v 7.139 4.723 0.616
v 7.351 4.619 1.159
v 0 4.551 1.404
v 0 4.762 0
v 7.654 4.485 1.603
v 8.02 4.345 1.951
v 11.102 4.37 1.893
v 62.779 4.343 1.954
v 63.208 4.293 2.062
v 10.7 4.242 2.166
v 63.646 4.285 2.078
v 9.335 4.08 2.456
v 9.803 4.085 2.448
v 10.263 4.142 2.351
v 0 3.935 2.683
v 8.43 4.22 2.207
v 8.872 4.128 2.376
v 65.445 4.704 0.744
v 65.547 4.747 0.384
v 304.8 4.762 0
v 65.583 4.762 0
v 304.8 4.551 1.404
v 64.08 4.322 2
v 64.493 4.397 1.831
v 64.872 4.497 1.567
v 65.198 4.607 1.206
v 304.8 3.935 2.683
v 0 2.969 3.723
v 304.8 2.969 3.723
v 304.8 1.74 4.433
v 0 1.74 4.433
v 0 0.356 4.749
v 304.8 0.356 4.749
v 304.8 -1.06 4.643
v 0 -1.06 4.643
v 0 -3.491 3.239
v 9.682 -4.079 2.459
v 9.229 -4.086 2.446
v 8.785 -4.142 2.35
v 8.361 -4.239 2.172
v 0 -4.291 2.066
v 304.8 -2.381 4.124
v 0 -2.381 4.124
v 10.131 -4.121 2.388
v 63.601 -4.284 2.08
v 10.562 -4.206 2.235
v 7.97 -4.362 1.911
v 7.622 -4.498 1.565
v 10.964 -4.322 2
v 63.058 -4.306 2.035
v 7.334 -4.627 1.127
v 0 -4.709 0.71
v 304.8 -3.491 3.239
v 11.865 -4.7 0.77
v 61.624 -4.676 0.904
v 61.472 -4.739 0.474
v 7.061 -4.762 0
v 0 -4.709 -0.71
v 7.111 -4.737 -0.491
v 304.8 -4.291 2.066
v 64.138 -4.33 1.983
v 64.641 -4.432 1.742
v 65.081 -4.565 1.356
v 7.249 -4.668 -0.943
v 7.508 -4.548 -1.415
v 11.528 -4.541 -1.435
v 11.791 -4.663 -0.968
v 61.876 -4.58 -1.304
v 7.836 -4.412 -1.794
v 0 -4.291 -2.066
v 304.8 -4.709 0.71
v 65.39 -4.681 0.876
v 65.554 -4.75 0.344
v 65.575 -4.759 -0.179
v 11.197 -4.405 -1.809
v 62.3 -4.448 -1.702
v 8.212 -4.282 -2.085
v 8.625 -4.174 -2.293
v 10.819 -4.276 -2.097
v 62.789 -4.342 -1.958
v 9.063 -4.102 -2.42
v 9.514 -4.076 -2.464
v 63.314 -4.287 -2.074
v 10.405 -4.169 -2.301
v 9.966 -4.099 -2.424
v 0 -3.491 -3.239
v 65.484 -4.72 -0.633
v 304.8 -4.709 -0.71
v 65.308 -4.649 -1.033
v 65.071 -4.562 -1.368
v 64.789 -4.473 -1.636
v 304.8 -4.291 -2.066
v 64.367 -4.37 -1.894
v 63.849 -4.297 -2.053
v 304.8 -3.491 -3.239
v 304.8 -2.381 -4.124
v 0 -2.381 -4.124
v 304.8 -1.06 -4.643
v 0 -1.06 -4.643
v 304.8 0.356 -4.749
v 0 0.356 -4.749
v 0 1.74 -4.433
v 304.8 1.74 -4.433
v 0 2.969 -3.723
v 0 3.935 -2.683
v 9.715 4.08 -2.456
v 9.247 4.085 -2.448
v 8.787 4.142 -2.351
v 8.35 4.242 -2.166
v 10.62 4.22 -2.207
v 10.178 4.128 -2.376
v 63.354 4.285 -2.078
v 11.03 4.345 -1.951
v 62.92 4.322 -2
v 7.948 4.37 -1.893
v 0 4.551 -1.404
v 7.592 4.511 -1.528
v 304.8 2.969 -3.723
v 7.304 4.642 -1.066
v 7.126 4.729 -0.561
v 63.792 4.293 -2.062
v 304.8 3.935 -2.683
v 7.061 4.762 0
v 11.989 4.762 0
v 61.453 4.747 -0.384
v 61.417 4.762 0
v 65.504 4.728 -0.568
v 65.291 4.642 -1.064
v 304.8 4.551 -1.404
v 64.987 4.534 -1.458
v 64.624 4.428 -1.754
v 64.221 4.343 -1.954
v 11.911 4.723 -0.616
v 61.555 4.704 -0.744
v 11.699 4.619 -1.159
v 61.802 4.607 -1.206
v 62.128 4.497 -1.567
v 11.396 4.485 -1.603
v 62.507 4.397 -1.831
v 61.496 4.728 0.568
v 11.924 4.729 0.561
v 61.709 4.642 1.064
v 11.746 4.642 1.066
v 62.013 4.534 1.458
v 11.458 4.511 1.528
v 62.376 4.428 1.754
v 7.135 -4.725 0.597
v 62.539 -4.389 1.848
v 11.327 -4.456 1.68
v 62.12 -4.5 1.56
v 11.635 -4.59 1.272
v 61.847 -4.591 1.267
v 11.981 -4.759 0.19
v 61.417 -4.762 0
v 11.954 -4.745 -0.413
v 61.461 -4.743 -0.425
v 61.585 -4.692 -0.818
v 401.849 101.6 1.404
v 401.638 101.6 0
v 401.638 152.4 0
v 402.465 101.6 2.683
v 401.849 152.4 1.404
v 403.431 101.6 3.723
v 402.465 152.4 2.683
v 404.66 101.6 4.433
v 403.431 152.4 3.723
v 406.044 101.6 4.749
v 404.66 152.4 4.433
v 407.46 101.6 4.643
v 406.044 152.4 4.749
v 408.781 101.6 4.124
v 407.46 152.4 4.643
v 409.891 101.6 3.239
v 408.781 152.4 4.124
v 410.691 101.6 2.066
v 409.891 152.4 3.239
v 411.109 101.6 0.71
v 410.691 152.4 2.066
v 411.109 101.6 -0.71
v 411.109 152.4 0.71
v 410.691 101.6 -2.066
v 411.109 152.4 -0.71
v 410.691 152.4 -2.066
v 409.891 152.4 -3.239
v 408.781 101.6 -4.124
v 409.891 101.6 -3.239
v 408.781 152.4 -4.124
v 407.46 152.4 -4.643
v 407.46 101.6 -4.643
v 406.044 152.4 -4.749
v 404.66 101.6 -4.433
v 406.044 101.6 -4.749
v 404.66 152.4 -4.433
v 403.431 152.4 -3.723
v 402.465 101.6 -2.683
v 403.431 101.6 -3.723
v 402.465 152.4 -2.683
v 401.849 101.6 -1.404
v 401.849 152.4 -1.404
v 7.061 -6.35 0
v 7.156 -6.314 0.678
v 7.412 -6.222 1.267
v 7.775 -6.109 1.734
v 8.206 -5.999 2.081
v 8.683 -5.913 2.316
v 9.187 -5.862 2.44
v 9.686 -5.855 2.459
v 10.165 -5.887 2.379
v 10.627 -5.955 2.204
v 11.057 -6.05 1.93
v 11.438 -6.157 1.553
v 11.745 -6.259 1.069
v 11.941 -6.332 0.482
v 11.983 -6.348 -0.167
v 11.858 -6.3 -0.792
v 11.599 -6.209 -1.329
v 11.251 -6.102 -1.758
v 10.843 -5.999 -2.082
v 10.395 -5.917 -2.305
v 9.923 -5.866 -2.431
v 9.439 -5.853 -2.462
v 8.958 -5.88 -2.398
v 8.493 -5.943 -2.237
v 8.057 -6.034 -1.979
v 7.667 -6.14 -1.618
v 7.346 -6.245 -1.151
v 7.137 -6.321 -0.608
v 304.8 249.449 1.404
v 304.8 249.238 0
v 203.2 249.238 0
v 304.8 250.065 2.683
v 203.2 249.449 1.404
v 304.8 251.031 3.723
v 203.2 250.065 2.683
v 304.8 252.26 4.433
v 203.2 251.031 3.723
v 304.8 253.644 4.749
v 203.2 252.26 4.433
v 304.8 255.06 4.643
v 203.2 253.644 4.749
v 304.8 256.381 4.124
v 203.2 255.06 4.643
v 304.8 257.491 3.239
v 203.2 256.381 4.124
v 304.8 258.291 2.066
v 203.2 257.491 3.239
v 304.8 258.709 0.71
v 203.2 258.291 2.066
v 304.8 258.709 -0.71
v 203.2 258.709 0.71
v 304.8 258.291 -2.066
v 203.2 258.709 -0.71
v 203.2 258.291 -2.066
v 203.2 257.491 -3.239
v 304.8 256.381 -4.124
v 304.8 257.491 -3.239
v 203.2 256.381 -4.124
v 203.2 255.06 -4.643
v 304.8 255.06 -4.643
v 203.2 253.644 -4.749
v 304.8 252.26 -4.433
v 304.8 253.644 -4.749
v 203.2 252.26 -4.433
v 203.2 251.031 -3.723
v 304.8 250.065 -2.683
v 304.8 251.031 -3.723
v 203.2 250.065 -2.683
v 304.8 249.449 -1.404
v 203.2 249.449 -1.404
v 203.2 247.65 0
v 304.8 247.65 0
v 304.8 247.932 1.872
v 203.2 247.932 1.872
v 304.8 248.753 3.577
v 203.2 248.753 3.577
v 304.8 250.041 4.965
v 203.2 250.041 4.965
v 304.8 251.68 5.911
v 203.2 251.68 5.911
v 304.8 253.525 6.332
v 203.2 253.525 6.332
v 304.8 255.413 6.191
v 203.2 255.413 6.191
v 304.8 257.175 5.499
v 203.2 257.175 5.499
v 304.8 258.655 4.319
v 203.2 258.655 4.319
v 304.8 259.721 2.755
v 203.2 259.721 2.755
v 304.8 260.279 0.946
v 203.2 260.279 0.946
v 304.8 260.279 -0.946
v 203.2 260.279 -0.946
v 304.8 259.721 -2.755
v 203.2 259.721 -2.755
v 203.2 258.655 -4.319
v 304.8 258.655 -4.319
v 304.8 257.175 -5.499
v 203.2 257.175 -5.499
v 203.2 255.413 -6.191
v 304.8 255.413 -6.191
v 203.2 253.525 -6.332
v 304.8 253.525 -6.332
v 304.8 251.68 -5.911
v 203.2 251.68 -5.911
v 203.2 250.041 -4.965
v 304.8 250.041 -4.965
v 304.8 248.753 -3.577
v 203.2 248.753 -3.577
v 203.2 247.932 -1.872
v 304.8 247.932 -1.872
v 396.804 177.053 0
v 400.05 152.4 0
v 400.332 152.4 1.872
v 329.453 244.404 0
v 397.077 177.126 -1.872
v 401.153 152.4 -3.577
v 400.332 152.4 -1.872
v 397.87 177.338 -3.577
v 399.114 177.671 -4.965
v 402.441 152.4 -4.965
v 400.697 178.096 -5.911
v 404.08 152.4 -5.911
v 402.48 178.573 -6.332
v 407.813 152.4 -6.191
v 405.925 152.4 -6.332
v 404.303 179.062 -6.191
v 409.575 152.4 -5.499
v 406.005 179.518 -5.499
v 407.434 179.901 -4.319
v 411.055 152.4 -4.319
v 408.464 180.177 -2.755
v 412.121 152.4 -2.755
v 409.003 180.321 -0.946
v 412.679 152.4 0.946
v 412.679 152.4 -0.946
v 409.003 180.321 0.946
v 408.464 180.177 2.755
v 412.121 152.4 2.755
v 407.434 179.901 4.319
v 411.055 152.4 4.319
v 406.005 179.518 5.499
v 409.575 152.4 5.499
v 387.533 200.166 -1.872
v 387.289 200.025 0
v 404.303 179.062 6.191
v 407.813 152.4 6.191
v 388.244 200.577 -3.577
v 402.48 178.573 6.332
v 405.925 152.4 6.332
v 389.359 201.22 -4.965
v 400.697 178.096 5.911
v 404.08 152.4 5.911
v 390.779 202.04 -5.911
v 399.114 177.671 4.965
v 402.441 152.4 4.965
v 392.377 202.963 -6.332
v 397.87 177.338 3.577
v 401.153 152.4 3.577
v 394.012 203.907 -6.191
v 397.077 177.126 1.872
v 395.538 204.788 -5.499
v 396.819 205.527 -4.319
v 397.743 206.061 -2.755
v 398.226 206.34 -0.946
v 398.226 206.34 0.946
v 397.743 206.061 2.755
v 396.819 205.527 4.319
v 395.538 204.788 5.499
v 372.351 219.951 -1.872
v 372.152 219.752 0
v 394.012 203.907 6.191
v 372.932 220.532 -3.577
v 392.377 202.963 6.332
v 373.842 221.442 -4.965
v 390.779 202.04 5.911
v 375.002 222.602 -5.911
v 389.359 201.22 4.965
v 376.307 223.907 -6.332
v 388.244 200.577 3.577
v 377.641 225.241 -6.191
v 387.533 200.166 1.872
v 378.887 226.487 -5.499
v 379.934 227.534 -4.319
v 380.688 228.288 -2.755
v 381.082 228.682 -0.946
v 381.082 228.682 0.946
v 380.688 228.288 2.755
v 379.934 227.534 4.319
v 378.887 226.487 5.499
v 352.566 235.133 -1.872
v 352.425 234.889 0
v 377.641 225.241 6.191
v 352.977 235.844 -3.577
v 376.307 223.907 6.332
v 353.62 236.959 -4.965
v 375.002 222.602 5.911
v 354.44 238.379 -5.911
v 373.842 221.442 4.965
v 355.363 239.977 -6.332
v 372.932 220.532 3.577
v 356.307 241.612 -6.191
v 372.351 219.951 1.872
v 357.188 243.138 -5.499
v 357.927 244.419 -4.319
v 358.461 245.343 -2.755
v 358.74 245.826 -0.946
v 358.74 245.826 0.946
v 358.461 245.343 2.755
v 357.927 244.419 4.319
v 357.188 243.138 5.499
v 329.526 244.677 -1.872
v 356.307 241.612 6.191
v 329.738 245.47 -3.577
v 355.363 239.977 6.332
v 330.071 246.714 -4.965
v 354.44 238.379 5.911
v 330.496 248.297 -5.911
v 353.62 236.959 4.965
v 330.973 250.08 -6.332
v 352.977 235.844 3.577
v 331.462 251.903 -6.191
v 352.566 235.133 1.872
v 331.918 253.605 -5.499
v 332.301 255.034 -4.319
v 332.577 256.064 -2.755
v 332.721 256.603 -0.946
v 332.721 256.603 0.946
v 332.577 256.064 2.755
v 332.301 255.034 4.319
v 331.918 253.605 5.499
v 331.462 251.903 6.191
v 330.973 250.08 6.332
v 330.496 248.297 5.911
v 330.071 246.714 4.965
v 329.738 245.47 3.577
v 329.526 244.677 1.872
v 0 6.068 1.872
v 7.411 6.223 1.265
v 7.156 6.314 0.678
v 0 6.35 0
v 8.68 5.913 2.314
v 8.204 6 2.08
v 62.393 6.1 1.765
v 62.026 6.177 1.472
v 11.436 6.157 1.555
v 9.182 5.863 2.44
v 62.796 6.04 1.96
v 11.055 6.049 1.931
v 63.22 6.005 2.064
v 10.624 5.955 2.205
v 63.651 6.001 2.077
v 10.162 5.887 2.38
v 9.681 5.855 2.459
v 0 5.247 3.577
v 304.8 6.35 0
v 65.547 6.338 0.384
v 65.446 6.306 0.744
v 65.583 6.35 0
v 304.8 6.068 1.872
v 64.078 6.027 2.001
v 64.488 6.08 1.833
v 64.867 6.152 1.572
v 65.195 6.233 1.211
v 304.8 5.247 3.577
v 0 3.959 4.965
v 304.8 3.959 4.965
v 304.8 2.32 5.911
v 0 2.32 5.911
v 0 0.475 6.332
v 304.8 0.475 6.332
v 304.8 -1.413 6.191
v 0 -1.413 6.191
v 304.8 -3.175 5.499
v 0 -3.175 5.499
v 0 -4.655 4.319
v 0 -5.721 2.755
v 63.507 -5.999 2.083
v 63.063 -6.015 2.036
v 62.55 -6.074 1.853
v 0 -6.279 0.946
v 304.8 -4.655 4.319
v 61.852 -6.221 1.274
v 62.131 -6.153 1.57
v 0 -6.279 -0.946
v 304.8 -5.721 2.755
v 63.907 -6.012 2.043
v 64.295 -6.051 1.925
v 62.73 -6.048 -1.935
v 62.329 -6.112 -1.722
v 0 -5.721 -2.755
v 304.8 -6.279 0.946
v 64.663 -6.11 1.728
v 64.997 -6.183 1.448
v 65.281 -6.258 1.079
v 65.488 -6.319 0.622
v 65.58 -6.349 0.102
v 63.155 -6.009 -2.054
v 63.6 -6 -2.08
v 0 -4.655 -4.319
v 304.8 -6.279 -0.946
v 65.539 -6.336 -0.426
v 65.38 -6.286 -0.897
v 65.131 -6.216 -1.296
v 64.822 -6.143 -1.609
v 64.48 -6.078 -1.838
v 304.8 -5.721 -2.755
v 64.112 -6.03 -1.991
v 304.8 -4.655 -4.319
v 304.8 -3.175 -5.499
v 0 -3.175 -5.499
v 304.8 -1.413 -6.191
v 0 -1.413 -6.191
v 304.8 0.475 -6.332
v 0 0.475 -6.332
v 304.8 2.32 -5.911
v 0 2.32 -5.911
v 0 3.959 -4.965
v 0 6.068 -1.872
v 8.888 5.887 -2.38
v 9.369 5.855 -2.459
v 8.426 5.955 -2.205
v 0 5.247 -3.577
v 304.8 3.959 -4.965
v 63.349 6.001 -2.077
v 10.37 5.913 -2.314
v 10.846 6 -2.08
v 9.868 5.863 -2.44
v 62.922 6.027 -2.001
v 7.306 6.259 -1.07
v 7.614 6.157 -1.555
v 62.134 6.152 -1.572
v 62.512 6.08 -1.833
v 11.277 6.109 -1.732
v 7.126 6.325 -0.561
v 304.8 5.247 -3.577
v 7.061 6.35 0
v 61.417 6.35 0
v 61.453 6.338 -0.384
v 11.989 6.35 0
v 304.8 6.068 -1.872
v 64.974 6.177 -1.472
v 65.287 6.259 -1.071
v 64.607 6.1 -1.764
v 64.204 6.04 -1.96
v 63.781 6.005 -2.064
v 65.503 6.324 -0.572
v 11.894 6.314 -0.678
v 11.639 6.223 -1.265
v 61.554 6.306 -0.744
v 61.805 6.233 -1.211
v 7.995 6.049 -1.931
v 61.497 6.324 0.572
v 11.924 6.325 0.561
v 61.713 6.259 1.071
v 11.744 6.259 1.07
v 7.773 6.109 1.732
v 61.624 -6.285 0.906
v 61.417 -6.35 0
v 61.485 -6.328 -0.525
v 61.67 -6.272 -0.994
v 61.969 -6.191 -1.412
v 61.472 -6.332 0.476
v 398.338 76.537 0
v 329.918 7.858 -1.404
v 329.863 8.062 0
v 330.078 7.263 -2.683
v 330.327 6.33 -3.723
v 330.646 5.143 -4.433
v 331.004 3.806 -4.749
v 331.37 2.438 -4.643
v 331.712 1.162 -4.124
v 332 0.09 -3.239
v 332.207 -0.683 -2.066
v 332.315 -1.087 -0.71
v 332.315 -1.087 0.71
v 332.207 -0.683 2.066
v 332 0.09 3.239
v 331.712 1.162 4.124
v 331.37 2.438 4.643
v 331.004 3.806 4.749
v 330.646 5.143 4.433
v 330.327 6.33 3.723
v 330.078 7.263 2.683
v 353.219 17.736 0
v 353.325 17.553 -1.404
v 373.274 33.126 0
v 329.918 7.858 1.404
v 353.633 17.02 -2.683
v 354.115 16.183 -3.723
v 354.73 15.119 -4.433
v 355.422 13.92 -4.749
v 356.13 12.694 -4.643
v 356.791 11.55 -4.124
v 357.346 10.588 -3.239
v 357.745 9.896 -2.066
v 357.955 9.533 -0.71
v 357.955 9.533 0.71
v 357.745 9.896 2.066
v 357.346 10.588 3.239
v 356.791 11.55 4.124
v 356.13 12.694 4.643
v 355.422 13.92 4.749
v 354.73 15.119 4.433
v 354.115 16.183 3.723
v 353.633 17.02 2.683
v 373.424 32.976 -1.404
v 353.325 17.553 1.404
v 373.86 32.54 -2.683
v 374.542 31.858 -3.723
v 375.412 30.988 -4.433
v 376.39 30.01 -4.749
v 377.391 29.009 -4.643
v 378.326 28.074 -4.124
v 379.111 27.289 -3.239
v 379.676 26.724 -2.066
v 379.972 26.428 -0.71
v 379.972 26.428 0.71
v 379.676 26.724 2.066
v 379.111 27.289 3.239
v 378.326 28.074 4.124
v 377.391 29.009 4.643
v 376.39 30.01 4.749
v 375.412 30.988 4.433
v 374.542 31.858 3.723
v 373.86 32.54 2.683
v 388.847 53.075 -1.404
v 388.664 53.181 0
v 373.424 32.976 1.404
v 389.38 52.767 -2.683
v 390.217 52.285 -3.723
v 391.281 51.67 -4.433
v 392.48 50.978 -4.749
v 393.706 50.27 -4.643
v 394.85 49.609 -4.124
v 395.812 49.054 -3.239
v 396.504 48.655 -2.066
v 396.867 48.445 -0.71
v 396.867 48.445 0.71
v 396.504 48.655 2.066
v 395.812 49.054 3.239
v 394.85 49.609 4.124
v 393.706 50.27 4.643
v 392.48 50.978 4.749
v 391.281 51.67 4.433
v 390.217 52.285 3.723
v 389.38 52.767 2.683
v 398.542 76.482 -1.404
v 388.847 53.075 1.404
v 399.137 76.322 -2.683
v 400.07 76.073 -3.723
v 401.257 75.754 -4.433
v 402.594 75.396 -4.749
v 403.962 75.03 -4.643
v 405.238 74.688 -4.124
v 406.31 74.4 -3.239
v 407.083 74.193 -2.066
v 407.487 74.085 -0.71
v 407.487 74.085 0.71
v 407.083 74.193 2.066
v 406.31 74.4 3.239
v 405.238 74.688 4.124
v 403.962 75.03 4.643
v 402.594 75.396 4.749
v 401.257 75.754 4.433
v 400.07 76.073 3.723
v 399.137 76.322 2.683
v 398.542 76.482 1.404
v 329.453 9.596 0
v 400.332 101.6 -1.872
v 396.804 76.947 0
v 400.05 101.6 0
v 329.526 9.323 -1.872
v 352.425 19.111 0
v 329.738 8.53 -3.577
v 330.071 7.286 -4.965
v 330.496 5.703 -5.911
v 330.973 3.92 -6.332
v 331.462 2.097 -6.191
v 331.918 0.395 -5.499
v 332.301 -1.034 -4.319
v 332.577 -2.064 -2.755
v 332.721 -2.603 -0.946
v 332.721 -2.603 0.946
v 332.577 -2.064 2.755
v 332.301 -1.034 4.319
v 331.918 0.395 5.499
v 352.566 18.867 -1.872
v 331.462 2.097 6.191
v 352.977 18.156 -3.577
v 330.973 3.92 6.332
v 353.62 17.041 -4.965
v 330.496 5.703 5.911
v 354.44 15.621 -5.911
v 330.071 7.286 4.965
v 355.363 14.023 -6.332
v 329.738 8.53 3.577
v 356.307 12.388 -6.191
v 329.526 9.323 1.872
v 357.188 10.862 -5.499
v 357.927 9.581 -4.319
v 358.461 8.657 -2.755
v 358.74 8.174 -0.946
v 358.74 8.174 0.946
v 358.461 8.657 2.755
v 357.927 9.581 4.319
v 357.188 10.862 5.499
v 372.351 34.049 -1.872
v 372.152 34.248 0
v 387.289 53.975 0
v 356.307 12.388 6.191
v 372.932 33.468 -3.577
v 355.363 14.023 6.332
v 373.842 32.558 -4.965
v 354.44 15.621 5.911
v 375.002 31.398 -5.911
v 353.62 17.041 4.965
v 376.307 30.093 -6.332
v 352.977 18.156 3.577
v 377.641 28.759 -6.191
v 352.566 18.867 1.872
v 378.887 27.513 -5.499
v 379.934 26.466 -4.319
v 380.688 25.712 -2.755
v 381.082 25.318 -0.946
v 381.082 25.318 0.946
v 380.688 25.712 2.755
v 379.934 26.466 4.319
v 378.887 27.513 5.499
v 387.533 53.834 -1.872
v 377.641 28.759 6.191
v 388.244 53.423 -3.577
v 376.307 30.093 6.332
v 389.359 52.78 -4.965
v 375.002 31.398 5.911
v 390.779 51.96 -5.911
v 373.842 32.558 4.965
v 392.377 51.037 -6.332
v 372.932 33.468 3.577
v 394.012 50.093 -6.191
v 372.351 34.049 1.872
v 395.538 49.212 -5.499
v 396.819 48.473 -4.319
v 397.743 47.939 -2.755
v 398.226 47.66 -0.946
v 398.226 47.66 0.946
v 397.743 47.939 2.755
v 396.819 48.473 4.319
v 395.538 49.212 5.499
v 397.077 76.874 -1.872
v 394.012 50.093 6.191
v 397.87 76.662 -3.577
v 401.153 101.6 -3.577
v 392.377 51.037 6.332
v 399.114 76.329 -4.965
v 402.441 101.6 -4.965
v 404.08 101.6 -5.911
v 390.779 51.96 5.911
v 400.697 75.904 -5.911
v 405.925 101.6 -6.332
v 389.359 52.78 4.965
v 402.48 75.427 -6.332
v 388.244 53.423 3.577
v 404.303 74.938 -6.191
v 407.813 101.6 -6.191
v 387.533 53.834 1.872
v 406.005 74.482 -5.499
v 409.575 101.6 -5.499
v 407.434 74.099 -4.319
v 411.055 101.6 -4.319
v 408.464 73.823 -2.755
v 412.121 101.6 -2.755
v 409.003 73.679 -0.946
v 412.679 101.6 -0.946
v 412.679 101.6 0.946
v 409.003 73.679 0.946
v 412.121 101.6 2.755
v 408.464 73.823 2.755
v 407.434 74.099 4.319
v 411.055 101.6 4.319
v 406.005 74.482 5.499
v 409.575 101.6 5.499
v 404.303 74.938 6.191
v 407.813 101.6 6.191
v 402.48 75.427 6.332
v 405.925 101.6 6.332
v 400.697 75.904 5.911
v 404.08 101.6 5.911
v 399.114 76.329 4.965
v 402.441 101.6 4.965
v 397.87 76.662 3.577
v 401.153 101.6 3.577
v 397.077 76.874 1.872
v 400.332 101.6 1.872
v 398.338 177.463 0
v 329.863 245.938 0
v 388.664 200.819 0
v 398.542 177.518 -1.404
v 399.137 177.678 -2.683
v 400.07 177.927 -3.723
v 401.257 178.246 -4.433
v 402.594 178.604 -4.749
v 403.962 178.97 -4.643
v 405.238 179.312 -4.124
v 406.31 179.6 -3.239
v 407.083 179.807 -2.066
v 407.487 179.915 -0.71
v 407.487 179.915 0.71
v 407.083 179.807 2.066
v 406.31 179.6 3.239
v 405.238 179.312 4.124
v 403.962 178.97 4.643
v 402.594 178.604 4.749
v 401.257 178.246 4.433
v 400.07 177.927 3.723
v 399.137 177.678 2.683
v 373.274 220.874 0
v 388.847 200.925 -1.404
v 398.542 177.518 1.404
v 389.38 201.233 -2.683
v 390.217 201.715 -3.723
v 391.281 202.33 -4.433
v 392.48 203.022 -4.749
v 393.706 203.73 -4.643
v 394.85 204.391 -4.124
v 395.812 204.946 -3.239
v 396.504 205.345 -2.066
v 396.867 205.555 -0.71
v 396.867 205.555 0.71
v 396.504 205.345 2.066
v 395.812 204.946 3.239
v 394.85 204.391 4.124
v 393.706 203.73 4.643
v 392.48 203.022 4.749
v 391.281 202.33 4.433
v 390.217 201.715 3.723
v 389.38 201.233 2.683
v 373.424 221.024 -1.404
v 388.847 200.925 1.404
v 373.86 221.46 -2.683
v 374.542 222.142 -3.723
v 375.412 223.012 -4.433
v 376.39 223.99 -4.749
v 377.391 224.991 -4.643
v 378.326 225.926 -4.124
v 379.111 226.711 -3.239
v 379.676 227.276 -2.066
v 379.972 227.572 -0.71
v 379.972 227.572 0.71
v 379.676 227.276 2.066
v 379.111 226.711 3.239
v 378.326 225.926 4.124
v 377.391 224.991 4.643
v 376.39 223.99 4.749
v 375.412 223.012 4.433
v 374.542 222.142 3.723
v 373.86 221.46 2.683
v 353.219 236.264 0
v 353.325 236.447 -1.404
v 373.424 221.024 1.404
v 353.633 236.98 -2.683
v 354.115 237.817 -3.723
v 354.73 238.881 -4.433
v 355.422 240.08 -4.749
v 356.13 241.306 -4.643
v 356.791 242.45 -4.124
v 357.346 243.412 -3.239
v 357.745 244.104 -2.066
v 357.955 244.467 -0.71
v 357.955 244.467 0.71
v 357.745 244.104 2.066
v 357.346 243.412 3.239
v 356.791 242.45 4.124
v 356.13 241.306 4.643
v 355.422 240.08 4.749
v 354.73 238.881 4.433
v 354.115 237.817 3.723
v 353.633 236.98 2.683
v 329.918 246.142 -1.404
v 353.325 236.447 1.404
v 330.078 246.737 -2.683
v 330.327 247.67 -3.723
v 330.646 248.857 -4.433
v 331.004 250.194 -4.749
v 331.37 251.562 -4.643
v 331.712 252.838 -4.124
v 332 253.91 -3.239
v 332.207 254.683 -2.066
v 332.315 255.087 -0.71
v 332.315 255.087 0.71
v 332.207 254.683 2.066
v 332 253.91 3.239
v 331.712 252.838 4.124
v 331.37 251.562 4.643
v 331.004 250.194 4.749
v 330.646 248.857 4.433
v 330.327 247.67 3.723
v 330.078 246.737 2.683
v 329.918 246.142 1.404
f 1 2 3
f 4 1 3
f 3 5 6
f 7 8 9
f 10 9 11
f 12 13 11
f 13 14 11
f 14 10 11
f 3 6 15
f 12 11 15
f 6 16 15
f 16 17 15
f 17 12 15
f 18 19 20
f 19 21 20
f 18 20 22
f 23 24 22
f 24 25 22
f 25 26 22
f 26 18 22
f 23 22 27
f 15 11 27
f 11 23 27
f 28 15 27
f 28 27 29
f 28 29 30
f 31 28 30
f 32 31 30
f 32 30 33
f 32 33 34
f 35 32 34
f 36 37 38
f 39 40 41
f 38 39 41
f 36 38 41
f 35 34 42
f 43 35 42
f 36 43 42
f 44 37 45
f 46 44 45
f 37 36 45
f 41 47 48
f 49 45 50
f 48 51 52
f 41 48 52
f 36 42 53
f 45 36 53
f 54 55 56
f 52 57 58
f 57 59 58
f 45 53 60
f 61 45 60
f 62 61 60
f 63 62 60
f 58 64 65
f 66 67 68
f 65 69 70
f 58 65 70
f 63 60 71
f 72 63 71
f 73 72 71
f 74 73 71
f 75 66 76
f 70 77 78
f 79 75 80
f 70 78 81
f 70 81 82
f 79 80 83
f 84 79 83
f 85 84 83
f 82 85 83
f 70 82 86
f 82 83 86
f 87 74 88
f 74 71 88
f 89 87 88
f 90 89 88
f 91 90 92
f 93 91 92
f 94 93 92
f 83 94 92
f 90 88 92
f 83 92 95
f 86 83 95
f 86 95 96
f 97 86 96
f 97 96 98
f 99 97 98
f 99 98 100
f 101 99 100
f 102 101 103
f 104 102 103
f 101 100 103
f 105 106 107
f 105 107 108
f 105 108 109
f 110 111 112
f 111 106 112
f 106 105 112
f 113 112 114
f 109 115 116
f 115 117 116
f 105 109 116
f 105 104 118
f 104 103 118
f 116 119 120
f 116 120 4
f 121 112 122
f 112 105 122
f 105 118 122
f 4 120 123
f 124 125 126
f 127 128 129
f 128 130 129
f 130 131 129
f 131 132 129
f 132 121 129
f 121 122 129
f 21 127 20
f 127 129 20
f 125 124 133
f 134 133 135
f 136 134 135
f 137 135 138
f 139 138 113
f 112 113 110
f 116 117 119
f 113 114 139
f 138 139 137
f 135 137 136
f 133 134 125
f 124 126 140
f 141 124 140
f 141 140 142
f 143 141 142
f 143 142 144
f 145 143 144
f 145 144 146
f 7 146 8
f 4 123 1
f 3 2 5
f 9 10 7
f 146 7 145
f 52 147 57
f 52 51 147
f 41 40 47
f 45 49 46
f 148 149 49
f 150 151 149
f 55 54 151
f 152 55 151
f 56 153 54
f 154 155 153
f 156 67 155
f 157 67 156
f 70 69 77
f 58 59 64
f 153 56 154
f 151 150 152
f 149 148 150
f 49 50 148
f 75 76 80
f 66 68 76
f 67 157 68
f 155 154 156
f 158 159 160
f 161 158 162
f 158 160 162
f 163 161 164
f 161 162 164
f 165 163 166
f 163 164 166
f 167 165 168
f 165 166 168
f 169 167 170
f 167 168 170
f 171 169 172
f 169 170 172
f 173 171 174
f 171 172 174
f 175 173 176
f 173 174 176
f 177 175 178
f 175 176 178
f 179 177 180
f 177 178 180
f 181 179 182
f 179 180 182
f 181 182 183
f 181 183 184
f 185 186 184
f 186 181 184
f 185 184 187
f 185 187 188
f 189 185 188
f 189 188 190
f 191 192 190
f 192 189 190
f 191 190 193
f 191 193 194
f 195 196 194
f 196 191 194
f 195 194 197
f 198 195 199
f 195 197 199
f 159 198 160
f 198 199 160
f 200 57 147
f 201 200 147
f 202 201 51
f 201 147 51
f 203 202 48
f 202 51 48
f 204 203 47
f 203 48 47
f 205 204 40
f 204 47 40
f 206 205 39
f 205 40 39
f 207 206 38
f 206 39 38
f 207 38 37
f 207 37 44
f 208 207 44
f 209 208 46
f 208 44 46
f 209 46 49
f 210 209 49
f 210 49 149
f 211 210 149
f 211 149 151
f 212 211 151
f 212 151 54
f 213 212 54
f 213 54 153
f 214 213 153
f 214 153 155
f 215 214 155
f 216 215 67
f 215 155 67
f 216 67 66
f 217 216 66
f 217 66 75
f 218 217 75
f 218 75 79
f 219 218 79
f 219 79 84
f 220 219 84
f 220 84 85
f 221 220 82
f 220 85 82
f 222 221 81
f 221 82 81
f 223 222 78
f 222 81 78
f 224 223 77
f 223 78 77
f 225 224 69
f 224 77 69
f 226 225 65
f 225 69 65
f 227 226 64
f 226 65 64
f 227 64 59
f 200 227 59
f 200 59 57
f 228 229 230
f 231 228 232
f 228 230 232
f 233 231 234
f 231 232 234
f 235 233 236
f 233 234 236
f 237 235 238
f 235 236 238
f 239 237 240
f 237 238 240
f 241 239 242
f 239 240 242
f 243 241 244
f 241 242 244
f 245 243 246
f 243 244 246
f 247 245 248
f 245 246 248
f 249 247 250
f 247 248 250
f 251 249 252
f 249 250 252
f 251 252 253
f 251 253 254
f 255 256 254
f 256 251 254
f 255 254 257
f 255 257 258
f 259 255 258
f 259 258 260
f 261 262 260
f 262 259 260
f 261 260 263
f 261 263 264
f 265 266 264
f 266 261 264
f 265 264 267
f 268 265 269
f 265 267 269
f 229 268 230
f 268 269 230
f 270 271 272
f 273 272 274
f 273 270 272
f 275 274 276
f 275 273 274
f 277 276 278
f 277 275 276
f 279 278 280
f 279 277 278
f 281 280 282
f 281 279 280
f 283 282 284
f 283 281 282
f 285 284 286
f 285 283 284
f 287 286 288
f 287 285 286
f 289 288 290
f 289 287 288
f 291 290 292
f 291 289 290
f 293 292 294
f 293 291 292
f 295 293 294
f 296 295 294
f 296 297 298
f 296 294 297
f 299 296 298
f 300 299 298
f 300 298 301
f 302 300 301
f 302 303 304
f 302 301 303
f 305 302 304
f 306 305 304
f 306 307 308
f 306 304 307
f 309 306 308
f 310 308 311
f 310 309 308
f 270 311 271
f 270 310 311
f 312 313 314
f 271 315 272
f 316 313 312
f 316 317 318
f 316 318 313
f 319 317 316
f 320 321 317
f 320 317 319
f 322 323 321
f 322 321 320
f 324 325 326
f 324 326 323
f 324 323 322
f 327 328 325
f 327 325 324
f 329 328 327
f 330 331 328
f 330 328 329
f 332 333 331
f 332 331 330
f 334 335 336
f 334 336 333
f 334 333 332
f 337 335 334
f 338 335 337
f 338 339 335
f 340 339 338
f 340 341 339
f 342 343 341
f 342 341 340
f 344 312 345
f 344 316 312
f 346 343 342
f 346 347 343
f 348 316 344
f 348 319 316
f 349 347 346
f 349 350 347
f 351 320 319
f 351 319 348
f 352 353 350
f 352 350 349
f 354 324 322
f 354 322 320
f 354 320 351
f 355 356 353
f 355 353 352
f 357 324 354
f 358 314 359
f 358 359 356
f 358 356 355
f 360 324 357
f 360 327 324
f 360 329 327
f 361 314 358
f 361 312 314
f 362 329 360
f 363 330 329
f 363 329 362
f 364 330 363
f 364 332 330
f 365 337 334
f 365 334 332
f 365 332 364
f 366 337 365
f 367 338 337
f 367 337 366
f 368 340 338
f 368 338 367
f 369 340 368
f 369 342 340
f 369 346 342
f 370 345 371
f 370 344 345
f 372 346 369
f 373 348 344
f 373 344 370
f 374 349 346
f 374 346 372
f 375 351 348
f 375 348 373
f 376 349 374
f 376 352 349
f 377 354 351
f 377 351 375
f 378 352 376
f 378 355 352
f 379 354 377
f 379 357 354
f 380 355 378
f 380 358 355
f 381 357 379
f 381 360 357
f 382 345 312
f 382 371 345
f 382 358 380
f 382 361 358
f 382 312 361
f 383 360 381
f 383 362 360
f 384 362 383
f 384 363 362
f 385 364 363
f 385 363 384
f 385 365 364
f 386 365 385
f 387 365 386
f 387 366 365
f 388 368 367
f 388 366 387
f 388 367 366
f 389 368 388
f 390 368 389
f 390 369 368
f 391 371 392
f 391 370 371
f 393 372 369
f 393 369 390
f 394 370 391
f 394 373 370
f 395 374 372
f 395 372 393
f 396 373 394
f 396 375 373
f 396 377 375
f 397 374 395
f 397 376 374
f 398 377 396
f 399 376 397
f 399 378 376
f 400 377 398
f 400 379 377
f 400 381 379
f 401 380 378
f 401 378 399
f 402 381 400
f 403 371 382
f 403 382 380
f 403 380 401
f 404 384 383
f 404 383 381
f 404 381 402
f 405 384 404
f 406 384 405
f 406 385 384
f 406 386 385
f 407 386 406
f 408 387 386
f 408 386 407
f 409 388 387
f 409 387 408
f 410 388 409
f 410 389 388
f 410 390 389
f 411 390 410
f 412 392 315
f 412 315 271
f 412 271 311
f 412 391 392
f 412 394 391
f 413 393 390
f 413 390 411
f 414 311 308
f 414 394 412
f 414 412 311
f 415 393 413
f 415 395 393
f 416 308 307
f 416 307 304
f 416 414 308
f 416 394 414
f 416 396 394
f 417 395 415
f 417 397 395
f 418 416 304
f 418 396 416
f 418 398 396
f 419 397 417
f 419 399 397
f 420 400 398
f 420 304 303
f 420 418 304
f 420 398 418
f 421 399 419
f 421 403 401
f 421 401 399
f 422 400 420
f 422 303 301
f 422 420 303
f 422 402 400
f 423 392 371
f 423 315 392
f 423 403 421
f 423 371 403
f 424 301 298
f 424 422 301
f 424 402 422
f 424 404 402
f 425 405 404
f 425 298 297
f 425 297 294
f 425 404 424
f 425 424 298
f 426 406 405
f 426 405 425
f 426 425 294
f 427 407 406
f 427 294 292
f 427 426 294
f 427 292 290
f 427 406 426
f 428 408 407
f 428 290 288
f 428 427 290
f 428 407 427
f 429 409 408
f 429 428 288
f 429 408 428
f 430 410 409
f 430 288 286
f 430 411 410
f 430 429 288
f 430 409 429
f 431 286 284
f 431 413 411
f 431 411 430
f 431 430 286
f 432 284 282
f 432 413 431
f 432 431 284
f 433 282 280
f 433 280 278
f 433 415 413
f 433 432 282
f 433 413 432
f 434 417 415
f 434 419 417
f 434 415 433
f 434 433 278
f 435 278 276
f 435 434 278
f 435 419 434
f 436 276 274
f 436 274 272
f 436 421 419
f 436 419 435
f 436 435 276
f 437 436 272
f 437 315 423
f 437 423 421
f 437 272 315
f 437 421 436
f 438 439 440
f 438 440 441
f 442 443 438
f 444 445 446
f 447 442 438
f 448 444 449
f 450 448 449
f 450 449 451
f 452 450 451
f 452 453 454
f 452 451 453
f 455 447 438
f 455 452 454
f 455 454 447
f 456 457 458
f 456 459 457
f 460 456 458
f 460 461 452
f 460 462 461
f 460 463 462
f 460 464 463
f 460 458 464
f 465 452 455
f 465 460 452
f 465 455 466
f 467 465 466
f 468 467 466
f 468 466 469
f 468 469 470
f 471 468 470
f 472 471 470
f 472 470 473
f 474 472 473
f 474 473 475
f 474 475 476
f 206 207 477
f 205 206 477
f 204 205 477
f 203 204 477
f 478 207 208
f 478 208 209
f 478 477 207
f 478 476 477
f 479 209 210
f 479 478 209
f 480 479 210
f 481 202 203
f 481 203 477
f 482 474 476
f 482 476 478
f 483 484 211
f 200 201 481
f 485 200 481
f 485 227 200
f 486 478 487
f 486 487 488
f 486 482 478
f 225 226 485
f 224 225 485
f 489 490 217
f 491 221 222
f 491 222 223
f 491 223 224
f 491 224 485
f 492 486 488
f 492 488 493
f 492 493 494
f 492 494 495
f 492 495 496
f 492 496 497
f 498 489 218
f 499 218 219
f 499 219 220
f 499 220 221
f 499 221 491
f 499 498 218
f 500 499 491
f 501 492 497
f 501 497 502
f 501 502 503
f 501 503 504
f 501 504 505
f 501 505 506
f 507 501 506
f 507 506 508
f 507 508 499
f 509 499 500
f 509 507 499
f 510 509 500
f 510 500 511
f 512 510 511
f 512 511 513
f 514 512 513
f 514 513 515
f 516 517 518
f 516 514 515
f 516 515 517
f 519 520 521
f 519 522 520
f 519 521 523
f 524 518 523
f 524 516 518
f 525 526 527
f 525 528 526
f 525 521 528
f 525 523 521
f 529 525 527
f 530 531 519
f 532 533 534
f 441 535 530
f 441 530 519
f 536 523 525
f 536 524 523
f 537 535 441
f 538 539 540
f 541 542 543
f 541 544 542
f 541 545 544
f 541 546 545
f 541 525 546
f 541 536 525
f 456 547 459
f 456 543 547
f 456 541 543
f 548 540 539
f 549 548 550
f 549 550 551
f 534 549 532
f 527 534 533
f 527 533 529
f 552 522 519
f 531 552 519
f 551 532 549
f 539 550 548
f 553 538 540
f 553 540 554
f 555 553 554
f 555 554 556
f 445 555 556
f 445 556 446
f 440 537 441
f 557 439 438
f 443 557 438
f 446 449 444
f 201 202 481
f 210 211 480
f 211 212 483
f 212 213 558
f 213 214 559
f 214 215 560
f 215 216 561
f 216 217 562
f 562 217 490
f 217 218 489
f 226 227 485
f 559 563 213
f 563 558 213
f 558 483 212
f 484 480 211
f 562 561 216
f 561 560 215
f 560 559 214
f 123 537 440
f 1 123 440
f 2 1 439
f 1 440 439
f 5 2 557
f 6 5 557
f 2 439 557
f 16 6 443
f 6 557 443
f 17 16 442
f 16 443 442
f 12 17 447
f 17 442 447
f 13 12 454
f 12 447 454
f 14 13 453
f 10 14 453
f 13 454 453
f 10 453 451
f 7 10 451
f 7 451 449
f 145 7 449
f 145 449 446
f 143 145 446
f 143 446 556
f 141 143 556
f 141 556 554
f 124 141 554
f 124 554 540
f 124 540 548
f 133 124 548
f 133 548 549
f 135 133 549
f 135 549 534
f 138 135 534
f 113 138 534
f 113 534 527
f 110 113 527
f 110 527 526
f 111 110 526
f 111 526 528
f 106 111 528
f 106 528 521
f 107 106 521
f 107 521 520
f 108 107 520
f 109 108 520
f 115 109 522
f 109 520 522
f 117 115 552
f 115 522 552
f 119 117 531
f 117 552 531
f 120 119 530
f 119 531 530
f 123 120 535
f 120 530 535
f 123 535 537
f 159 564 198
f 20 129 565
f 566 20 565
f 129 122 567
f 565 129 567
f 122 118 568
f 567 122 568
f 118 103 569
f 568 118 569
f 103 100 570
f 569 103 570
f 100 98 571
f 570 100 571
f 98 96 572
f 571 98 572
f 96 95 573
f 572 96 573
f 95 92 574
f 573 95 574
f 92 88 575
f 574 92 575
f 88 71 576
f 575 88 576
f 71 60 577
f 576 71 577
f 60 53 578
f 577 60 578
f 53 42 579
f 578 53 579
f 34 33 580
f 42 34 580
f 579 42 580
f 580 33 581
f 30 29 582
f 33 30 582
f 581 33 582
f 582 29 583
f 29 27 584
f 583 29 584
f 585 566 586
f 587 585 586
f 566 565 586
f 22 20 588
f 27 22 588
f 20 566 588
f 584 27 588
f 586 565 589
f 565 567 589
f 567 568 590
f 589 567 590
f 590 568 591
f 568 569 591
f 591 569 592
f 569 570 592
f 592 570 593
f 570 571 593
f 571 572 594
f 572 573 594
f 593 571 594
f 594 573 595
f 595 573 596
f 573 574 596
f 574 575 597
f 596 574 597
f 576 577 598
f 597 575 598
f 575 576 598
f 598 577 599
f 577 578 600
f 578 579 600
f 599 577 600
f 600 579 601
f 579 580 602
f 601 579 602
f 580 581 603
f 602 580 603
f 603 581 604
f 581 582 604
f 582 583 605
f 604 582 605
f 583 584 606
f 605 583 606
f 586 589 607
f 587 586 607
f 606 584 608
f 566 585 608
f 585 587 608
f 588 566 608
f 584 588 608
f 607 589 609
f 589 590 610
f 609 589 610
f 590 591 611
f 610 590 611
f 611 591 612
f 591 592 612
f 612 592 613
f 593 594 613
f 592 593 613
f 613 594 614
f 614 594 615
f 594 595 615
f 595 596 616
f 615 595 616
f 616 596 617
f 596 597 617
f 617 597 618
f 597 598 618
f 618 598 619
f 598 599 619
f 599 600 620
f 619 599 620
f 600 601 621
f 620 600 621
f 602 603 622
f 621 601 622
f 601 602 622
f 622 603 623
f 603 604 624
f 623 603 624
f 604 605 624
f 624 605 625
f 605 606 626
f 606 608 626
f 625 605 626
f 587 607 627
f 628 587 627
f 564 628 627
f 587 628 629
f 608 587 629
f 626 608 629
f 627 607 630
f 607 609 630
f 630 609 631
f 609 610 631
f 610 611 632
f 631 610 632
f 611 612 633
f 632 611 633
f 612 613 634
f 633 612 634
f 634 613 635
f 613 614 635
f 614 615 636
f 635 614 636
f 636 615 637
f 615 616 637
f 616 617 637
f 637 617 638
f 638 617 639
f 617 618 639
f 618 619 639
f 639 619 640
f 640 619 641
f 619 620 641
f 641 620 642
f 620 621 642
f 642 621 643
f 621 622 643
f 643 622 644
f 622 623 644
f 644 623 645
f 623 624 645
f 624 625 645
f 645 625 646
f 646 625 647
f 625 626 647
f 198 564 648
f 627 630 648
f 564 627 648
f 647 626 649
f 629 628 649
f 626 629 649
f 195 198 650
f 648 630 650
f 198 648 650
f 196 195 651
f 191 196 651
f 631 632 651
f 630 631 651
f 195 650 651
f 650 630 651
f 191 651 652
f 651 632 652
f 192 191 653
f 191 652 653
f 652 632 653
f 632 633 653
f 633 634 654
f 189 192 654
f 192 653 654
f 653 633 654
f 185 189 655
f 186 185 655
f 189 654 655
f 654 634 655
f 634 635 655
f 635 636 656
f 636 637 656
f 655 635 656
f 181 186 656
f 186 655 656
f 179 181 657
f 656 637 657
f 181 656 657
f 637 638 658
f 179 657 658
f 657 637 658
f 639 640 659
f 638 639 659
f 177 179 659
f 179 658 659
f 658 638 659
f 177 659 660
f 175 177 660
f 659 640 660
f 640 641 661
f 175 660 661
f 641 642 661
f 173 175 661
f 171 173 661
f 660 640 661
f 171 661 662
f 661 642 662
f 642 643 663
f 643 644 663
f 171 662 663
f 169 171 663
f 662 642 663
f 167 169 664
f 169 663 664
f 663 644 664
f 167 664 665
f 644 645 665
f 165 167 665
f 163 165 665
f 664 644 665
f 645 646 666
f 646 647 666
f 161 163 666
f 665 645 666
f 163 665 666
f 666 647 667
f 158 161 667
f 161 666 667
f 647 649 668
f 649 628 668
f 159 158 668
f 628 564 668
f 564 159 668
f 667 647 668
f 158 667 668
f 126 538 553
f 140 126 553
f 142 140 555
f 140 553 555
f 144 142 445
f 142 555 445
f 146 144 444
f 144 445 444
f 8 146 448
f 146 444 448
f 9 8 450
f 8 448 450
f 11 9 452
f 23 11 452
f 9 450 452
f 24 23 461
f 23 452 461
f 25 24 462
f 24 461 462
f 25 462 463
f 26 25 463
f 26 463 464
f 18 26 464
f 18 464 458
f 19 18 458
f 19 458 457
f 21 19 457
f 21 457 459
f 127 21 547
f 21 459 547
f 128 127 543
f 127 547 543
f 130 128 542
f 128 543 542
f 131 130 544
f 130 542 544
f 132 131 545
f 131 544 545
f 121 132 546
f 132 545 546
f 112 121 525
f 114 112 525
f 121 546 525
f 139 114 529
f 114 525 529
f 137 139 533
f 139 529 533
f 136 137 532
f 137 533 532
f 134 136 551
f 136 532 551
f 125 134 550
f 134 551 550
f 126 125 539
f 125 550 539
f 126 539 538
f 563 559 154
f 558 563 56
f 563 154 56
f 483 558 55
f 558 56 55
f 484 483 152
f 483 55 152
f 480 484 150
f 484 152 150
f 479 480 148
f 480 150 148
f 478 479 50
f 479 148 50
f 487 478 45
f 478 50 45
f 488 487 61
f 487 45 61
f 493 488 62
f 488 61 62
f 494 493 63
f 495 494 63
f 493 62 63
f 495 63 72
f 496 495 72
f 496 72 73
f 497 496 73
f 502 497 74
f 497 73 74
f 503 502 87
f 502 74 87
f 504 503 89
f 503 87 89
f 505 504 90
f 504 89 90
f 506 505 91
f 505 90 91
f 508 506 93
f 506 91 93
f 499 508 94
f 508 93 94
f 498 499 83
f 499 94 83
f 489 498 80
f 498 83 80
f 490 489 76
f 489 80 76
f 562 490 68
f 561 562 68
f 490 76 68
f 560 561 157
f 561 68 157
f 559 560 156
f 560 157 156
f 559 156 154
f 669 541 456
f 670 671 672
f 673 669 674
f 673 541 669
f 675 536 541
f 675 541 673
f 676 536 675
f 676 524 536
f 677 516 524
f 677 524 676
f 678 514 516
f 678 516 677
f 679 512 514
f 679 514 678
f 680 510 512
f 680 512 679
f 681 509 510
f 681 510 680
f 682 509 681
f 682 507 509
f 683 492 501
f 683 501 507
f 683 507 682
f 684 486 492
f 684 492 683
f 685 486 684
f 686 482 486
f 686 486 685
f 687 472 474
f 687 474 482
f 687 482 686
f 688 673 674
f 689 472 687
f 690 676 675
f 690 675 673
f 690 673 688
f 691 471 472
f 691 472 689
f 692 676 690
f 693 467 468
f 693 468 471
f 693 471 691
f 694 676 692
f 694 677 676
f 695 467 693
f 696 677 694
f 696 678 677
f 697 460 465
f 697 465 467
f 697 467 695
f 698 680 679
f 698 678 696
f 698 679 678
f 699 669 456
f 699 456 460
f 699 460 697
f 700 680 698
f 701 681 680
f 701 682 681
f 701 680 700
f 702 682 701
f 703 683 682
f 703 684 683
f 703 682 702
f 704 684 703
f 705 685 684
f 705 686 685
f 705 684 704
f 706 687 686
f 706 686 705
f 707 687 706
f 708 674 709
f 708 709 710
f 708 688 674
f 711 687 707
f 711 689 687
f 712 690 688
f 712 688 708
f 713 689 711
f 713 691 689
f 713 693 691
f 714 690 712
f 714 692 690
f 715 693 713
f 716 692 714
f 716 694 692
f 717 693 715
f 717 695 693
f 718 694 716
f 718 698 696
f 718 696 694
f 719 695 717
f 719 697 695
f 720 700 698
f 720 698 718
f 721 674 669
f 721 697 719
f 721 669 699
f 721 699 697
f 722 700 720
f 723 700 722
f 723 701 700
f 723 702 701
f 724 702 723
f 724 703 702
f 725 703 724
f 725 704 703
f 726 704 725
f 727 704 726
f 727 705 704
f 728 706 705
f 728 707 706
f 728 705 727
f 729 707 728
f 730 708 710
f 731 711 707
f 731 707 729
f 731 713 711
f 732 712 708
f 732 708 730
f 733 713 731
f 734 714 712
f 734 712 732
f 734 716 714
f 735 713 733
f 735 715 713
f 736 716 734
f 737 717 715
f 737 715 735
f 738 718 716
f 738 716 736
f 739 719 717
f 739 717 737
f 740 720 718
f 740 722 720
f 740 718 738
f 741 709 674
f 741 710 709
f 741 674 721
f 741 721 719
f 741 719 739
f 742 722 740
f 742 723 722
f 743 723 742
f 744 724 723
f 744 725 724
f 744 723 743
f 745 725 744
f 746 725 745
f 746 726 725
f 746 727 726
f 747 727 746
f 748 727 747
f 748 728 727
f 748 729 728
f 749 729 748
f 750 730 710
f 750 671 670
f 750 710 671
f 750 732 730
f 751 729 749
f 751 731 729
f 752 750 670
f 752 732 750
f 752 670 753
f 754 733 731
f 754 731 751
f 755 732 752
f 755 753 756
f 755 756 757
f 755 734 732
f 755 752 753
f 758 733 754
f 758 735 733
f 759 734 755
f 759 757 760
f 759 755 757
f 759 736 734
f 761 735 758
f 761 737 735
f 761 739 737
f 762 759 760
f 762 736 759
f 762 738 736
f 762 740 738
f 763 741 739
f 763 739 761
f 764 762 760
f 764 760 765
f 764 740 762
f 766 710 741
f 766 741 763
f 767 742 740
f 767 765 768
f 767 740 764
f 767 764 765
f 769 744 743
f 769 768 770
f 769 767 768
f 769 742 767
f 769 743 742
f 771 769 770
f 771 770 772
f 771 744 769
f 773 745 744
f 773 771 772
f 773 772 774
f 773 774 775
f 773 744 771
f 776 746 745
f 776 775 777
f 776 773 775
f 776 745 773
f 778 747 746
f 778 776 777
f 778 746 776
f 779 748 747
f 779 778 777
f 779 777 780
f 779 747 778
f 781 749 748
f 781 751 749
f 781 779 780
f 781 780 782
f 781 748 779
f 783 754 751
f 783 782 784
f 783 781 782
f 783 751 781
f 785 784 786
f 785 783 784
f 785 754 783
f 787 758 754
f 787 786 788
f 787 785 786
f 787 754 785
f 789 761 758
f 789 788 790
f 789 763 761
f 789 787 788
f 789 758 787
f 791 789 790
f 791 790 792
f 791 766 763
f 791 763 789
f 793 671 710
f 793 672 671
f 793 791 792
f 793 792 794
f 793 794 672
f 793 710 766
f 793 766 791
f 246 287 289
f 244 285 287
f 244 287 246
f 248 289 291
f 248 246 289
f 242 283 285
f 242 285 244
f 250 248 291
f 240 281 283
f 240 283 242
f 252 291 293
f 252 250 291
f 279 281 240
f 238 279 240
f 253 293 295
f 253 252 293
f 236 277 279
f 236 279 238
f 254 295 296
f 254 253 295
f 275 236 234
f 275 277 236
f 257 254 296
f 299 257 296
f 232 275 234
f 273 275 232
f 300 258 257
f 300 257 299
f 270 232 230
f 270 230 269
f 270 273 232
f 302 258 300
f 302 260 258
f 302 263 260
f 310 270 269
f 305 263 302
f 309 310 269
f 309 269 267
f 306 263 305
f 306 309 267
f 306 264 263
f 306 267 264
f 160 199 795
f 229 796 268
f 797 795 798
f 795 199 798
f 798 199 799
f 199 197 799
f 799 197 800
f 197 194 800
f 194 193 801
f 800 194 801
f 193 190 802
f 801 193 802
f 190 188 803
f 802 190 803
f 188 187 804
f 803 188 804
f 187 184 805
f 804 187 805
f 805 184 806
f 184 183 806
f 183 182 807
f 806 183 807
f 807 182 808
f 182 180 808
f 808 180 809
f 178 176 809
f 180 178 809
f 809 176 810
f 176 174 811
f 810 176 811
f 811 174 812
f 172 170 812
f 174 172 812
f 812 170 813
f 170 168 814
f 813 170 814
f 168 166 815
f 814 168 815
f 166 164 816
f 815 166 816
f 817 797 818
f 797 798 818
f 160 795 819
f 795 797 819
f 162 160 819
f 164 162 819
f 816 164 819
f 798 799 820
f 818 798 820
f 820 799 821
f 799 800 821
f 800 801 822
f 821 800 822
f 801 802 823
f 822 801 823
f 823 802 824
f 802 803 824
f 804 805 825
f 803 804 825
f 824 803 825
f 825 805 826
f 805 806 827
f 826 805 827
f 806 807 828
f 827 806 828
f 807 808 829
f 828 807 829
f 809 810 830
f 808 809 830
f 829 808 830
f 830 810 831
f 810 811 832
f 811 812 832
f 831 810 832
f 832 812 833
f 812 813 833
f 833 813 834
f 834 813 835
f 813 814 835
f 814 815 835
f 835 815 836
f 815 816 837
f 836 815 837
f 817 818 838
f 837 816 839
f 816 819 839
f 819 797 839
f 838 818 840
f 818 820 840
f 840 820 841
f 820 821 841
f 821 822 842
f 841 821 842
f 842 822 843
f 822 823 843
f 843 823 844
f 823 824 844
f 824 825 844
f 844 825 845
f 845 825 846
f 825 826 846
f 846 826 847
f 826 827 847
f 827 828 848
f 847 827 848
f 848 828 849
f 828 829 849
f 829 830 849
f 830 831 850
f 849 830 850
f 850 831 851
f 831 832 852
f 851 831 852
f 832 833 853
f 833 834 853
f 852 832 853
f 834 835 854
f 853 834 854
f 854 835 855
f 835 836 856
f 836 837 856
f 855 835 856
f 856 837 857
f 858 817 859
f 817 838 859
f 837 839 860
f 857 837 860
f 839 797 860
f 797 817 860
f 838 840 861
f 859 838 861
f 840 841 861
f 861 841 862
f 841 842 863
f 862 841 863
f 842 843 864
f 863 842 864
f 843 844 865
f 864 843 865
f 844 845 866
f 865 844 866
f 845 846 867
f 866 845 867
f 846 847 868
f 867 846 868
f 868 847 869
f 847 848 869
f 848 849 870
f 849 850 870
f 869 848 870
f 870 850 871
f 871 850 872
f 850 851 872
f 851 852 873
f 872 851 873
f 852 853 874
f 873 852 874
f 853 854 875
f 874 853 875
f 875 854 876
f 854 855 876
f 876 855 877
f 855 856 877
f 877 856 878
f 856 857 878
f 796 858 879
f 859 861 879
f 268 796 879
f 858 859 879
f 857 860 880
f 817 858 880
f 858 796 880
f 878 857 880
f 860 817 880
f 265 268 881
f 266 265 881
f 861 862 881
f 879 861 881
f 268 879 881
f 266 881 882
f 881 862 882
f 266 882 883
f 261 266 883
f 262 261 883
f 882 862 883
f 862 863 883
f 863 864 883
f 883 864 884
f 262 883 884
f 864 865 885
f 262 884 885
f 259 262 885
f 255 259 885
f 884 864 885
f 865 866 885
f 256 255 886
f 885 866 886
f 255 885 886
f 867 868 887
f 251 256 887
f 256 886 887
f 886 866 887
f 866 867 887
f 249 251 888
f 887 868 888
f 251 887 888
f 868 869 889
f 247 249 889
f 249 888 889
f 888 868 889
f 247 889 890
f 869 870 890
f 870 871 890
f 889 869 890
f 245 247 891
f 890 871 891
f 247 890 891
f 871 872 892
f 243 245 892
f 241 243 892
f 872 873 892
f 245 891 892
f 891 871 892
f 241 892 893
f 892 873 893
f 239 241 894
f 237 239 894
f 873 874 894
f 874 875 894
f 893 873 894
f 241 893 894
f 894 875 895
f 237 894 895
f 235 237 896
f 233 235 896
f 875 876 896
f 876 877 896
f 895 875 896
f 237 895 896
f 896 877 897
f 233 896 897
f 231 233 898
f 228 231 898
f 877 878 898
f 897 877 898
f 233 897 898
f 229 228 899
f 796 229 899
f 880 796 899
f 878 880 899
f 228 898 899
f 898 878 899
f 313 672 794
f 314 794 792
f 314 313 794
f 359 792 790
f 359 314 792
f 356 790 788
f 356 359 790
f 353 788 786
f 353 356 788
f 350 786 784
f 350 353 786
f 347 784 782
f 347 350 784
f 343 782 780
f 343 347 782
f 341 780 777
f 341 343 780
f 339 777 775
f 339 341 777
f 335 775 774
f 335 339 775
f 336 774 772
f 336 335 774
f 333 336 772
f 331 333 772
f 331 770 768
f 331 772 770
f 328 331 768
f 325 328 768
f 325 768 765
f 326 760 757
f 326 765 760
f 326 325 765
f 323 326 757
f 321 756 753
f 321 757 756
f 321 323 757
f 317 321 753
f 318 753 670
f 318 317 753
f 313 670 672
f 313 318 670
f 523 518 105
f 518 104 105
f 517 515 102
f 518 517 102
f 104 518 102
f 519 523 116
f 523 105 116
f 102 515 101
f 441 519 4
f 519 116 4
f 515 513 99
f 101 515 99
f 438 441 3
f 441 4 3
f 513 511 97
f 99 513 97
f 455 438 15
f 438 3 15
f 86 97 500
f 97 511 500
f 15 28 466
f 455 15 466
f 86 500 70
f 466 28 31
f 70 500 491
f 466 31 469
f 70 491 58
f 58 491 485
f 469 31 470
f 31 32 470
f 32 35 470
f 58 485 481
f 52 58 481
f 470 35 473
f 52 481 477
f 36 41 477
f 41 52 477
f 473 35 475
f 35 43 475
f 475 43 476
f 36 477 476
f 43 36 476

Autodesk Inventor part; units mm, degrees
ref_plane "YZ Plane" through (0, 0, 0) normal (1, 0, 0) x (0, 1, 0)
ref_plane "XY Plane" through (0, 0, 0) normal (0, 0, 1) x (1, 0, 0)
sketch "Sketch1" plane through (0, 0, 0) normal (0, 0, 1) x (1, 0, 0)
  line L0 (0, 0) -> (304.8, 0)
  arc A0 (304.8, 0) -> (406.4, 101.6) centre (304.8, 101.6) ccw
  line L1 (406.4, 101.6) -> (406.4, 152.4)
  line L2 (304.8, 0) -> (304.8, 101.6) construction
  line L3 (304.8, 101.6) -> (406.4, 101.6) construction
  arc A1 (406.4, 152.4) -> (304.8, 254) centre (304.8, 152.4) ccw
  line L4 (406.4, 152.4) -> (304.8, 152.4) construction
  line L5 (304.8, 152.4) -> (304.8, 254) construction
  line L6 (304.8, 254) -> (203.2, 254)
  circle A2 centre (668.9835, 281.347) radius 317.5 construction
  dimension "d0" = 304.8
  dimension "d1" = 101.6
  dimension "d2" = 50.8
  dimension "d3" = 101.6
  dimension "d4" = 101.6
  dimension "d7" = 635
sketch "Sketch2" plane through (0, 0, 0) normal (1, 0, 0) x (0, 1, 0)
  circle A0 centre (0, 0) radius 6.35
  circle A1 centre (0, 0) radius 4.7625
  dimension "d5" = 12.7
  dimension "d8" = 9.525
sweep "Sweep1" add profiles "Sketch2" path "Sketch1"
ref_plane "Work Plane1" through (0, 6.35, 0) normal (0, 1, 0) x (-1, 0, 0)
sketch "Sketch3" plane through (0, 6.35, 0) normal (0, 1, 0) x (-1, 0, 0)
  circle A0 centre (-63.5, 0) radius 2.0828
  line L0 (0, 6.35) -> (-304.8, 6.35) projected
  line L1 (0, -6.35) -> (-304.8, -6.35) projected
  line L2 (0, -6.35) -> (0, 6.35) projected
  circle A1 centre (-9.525, 0) radius 2.4638
  point P0 (0, 0)
  dimension "d9" = 4.1656
  dimension "d10" = 63.5
  dimension "d11" = 6.35
  dimension "d14" = 4.9276
  dimension "d15" = 9.525
  dimension "d16" = 6.35
extrude "Extrusion1" cut sketch "Sketch3" against normal blind 25.4
properties part number "Metal Pipe Clamp" material "Aluminum"
